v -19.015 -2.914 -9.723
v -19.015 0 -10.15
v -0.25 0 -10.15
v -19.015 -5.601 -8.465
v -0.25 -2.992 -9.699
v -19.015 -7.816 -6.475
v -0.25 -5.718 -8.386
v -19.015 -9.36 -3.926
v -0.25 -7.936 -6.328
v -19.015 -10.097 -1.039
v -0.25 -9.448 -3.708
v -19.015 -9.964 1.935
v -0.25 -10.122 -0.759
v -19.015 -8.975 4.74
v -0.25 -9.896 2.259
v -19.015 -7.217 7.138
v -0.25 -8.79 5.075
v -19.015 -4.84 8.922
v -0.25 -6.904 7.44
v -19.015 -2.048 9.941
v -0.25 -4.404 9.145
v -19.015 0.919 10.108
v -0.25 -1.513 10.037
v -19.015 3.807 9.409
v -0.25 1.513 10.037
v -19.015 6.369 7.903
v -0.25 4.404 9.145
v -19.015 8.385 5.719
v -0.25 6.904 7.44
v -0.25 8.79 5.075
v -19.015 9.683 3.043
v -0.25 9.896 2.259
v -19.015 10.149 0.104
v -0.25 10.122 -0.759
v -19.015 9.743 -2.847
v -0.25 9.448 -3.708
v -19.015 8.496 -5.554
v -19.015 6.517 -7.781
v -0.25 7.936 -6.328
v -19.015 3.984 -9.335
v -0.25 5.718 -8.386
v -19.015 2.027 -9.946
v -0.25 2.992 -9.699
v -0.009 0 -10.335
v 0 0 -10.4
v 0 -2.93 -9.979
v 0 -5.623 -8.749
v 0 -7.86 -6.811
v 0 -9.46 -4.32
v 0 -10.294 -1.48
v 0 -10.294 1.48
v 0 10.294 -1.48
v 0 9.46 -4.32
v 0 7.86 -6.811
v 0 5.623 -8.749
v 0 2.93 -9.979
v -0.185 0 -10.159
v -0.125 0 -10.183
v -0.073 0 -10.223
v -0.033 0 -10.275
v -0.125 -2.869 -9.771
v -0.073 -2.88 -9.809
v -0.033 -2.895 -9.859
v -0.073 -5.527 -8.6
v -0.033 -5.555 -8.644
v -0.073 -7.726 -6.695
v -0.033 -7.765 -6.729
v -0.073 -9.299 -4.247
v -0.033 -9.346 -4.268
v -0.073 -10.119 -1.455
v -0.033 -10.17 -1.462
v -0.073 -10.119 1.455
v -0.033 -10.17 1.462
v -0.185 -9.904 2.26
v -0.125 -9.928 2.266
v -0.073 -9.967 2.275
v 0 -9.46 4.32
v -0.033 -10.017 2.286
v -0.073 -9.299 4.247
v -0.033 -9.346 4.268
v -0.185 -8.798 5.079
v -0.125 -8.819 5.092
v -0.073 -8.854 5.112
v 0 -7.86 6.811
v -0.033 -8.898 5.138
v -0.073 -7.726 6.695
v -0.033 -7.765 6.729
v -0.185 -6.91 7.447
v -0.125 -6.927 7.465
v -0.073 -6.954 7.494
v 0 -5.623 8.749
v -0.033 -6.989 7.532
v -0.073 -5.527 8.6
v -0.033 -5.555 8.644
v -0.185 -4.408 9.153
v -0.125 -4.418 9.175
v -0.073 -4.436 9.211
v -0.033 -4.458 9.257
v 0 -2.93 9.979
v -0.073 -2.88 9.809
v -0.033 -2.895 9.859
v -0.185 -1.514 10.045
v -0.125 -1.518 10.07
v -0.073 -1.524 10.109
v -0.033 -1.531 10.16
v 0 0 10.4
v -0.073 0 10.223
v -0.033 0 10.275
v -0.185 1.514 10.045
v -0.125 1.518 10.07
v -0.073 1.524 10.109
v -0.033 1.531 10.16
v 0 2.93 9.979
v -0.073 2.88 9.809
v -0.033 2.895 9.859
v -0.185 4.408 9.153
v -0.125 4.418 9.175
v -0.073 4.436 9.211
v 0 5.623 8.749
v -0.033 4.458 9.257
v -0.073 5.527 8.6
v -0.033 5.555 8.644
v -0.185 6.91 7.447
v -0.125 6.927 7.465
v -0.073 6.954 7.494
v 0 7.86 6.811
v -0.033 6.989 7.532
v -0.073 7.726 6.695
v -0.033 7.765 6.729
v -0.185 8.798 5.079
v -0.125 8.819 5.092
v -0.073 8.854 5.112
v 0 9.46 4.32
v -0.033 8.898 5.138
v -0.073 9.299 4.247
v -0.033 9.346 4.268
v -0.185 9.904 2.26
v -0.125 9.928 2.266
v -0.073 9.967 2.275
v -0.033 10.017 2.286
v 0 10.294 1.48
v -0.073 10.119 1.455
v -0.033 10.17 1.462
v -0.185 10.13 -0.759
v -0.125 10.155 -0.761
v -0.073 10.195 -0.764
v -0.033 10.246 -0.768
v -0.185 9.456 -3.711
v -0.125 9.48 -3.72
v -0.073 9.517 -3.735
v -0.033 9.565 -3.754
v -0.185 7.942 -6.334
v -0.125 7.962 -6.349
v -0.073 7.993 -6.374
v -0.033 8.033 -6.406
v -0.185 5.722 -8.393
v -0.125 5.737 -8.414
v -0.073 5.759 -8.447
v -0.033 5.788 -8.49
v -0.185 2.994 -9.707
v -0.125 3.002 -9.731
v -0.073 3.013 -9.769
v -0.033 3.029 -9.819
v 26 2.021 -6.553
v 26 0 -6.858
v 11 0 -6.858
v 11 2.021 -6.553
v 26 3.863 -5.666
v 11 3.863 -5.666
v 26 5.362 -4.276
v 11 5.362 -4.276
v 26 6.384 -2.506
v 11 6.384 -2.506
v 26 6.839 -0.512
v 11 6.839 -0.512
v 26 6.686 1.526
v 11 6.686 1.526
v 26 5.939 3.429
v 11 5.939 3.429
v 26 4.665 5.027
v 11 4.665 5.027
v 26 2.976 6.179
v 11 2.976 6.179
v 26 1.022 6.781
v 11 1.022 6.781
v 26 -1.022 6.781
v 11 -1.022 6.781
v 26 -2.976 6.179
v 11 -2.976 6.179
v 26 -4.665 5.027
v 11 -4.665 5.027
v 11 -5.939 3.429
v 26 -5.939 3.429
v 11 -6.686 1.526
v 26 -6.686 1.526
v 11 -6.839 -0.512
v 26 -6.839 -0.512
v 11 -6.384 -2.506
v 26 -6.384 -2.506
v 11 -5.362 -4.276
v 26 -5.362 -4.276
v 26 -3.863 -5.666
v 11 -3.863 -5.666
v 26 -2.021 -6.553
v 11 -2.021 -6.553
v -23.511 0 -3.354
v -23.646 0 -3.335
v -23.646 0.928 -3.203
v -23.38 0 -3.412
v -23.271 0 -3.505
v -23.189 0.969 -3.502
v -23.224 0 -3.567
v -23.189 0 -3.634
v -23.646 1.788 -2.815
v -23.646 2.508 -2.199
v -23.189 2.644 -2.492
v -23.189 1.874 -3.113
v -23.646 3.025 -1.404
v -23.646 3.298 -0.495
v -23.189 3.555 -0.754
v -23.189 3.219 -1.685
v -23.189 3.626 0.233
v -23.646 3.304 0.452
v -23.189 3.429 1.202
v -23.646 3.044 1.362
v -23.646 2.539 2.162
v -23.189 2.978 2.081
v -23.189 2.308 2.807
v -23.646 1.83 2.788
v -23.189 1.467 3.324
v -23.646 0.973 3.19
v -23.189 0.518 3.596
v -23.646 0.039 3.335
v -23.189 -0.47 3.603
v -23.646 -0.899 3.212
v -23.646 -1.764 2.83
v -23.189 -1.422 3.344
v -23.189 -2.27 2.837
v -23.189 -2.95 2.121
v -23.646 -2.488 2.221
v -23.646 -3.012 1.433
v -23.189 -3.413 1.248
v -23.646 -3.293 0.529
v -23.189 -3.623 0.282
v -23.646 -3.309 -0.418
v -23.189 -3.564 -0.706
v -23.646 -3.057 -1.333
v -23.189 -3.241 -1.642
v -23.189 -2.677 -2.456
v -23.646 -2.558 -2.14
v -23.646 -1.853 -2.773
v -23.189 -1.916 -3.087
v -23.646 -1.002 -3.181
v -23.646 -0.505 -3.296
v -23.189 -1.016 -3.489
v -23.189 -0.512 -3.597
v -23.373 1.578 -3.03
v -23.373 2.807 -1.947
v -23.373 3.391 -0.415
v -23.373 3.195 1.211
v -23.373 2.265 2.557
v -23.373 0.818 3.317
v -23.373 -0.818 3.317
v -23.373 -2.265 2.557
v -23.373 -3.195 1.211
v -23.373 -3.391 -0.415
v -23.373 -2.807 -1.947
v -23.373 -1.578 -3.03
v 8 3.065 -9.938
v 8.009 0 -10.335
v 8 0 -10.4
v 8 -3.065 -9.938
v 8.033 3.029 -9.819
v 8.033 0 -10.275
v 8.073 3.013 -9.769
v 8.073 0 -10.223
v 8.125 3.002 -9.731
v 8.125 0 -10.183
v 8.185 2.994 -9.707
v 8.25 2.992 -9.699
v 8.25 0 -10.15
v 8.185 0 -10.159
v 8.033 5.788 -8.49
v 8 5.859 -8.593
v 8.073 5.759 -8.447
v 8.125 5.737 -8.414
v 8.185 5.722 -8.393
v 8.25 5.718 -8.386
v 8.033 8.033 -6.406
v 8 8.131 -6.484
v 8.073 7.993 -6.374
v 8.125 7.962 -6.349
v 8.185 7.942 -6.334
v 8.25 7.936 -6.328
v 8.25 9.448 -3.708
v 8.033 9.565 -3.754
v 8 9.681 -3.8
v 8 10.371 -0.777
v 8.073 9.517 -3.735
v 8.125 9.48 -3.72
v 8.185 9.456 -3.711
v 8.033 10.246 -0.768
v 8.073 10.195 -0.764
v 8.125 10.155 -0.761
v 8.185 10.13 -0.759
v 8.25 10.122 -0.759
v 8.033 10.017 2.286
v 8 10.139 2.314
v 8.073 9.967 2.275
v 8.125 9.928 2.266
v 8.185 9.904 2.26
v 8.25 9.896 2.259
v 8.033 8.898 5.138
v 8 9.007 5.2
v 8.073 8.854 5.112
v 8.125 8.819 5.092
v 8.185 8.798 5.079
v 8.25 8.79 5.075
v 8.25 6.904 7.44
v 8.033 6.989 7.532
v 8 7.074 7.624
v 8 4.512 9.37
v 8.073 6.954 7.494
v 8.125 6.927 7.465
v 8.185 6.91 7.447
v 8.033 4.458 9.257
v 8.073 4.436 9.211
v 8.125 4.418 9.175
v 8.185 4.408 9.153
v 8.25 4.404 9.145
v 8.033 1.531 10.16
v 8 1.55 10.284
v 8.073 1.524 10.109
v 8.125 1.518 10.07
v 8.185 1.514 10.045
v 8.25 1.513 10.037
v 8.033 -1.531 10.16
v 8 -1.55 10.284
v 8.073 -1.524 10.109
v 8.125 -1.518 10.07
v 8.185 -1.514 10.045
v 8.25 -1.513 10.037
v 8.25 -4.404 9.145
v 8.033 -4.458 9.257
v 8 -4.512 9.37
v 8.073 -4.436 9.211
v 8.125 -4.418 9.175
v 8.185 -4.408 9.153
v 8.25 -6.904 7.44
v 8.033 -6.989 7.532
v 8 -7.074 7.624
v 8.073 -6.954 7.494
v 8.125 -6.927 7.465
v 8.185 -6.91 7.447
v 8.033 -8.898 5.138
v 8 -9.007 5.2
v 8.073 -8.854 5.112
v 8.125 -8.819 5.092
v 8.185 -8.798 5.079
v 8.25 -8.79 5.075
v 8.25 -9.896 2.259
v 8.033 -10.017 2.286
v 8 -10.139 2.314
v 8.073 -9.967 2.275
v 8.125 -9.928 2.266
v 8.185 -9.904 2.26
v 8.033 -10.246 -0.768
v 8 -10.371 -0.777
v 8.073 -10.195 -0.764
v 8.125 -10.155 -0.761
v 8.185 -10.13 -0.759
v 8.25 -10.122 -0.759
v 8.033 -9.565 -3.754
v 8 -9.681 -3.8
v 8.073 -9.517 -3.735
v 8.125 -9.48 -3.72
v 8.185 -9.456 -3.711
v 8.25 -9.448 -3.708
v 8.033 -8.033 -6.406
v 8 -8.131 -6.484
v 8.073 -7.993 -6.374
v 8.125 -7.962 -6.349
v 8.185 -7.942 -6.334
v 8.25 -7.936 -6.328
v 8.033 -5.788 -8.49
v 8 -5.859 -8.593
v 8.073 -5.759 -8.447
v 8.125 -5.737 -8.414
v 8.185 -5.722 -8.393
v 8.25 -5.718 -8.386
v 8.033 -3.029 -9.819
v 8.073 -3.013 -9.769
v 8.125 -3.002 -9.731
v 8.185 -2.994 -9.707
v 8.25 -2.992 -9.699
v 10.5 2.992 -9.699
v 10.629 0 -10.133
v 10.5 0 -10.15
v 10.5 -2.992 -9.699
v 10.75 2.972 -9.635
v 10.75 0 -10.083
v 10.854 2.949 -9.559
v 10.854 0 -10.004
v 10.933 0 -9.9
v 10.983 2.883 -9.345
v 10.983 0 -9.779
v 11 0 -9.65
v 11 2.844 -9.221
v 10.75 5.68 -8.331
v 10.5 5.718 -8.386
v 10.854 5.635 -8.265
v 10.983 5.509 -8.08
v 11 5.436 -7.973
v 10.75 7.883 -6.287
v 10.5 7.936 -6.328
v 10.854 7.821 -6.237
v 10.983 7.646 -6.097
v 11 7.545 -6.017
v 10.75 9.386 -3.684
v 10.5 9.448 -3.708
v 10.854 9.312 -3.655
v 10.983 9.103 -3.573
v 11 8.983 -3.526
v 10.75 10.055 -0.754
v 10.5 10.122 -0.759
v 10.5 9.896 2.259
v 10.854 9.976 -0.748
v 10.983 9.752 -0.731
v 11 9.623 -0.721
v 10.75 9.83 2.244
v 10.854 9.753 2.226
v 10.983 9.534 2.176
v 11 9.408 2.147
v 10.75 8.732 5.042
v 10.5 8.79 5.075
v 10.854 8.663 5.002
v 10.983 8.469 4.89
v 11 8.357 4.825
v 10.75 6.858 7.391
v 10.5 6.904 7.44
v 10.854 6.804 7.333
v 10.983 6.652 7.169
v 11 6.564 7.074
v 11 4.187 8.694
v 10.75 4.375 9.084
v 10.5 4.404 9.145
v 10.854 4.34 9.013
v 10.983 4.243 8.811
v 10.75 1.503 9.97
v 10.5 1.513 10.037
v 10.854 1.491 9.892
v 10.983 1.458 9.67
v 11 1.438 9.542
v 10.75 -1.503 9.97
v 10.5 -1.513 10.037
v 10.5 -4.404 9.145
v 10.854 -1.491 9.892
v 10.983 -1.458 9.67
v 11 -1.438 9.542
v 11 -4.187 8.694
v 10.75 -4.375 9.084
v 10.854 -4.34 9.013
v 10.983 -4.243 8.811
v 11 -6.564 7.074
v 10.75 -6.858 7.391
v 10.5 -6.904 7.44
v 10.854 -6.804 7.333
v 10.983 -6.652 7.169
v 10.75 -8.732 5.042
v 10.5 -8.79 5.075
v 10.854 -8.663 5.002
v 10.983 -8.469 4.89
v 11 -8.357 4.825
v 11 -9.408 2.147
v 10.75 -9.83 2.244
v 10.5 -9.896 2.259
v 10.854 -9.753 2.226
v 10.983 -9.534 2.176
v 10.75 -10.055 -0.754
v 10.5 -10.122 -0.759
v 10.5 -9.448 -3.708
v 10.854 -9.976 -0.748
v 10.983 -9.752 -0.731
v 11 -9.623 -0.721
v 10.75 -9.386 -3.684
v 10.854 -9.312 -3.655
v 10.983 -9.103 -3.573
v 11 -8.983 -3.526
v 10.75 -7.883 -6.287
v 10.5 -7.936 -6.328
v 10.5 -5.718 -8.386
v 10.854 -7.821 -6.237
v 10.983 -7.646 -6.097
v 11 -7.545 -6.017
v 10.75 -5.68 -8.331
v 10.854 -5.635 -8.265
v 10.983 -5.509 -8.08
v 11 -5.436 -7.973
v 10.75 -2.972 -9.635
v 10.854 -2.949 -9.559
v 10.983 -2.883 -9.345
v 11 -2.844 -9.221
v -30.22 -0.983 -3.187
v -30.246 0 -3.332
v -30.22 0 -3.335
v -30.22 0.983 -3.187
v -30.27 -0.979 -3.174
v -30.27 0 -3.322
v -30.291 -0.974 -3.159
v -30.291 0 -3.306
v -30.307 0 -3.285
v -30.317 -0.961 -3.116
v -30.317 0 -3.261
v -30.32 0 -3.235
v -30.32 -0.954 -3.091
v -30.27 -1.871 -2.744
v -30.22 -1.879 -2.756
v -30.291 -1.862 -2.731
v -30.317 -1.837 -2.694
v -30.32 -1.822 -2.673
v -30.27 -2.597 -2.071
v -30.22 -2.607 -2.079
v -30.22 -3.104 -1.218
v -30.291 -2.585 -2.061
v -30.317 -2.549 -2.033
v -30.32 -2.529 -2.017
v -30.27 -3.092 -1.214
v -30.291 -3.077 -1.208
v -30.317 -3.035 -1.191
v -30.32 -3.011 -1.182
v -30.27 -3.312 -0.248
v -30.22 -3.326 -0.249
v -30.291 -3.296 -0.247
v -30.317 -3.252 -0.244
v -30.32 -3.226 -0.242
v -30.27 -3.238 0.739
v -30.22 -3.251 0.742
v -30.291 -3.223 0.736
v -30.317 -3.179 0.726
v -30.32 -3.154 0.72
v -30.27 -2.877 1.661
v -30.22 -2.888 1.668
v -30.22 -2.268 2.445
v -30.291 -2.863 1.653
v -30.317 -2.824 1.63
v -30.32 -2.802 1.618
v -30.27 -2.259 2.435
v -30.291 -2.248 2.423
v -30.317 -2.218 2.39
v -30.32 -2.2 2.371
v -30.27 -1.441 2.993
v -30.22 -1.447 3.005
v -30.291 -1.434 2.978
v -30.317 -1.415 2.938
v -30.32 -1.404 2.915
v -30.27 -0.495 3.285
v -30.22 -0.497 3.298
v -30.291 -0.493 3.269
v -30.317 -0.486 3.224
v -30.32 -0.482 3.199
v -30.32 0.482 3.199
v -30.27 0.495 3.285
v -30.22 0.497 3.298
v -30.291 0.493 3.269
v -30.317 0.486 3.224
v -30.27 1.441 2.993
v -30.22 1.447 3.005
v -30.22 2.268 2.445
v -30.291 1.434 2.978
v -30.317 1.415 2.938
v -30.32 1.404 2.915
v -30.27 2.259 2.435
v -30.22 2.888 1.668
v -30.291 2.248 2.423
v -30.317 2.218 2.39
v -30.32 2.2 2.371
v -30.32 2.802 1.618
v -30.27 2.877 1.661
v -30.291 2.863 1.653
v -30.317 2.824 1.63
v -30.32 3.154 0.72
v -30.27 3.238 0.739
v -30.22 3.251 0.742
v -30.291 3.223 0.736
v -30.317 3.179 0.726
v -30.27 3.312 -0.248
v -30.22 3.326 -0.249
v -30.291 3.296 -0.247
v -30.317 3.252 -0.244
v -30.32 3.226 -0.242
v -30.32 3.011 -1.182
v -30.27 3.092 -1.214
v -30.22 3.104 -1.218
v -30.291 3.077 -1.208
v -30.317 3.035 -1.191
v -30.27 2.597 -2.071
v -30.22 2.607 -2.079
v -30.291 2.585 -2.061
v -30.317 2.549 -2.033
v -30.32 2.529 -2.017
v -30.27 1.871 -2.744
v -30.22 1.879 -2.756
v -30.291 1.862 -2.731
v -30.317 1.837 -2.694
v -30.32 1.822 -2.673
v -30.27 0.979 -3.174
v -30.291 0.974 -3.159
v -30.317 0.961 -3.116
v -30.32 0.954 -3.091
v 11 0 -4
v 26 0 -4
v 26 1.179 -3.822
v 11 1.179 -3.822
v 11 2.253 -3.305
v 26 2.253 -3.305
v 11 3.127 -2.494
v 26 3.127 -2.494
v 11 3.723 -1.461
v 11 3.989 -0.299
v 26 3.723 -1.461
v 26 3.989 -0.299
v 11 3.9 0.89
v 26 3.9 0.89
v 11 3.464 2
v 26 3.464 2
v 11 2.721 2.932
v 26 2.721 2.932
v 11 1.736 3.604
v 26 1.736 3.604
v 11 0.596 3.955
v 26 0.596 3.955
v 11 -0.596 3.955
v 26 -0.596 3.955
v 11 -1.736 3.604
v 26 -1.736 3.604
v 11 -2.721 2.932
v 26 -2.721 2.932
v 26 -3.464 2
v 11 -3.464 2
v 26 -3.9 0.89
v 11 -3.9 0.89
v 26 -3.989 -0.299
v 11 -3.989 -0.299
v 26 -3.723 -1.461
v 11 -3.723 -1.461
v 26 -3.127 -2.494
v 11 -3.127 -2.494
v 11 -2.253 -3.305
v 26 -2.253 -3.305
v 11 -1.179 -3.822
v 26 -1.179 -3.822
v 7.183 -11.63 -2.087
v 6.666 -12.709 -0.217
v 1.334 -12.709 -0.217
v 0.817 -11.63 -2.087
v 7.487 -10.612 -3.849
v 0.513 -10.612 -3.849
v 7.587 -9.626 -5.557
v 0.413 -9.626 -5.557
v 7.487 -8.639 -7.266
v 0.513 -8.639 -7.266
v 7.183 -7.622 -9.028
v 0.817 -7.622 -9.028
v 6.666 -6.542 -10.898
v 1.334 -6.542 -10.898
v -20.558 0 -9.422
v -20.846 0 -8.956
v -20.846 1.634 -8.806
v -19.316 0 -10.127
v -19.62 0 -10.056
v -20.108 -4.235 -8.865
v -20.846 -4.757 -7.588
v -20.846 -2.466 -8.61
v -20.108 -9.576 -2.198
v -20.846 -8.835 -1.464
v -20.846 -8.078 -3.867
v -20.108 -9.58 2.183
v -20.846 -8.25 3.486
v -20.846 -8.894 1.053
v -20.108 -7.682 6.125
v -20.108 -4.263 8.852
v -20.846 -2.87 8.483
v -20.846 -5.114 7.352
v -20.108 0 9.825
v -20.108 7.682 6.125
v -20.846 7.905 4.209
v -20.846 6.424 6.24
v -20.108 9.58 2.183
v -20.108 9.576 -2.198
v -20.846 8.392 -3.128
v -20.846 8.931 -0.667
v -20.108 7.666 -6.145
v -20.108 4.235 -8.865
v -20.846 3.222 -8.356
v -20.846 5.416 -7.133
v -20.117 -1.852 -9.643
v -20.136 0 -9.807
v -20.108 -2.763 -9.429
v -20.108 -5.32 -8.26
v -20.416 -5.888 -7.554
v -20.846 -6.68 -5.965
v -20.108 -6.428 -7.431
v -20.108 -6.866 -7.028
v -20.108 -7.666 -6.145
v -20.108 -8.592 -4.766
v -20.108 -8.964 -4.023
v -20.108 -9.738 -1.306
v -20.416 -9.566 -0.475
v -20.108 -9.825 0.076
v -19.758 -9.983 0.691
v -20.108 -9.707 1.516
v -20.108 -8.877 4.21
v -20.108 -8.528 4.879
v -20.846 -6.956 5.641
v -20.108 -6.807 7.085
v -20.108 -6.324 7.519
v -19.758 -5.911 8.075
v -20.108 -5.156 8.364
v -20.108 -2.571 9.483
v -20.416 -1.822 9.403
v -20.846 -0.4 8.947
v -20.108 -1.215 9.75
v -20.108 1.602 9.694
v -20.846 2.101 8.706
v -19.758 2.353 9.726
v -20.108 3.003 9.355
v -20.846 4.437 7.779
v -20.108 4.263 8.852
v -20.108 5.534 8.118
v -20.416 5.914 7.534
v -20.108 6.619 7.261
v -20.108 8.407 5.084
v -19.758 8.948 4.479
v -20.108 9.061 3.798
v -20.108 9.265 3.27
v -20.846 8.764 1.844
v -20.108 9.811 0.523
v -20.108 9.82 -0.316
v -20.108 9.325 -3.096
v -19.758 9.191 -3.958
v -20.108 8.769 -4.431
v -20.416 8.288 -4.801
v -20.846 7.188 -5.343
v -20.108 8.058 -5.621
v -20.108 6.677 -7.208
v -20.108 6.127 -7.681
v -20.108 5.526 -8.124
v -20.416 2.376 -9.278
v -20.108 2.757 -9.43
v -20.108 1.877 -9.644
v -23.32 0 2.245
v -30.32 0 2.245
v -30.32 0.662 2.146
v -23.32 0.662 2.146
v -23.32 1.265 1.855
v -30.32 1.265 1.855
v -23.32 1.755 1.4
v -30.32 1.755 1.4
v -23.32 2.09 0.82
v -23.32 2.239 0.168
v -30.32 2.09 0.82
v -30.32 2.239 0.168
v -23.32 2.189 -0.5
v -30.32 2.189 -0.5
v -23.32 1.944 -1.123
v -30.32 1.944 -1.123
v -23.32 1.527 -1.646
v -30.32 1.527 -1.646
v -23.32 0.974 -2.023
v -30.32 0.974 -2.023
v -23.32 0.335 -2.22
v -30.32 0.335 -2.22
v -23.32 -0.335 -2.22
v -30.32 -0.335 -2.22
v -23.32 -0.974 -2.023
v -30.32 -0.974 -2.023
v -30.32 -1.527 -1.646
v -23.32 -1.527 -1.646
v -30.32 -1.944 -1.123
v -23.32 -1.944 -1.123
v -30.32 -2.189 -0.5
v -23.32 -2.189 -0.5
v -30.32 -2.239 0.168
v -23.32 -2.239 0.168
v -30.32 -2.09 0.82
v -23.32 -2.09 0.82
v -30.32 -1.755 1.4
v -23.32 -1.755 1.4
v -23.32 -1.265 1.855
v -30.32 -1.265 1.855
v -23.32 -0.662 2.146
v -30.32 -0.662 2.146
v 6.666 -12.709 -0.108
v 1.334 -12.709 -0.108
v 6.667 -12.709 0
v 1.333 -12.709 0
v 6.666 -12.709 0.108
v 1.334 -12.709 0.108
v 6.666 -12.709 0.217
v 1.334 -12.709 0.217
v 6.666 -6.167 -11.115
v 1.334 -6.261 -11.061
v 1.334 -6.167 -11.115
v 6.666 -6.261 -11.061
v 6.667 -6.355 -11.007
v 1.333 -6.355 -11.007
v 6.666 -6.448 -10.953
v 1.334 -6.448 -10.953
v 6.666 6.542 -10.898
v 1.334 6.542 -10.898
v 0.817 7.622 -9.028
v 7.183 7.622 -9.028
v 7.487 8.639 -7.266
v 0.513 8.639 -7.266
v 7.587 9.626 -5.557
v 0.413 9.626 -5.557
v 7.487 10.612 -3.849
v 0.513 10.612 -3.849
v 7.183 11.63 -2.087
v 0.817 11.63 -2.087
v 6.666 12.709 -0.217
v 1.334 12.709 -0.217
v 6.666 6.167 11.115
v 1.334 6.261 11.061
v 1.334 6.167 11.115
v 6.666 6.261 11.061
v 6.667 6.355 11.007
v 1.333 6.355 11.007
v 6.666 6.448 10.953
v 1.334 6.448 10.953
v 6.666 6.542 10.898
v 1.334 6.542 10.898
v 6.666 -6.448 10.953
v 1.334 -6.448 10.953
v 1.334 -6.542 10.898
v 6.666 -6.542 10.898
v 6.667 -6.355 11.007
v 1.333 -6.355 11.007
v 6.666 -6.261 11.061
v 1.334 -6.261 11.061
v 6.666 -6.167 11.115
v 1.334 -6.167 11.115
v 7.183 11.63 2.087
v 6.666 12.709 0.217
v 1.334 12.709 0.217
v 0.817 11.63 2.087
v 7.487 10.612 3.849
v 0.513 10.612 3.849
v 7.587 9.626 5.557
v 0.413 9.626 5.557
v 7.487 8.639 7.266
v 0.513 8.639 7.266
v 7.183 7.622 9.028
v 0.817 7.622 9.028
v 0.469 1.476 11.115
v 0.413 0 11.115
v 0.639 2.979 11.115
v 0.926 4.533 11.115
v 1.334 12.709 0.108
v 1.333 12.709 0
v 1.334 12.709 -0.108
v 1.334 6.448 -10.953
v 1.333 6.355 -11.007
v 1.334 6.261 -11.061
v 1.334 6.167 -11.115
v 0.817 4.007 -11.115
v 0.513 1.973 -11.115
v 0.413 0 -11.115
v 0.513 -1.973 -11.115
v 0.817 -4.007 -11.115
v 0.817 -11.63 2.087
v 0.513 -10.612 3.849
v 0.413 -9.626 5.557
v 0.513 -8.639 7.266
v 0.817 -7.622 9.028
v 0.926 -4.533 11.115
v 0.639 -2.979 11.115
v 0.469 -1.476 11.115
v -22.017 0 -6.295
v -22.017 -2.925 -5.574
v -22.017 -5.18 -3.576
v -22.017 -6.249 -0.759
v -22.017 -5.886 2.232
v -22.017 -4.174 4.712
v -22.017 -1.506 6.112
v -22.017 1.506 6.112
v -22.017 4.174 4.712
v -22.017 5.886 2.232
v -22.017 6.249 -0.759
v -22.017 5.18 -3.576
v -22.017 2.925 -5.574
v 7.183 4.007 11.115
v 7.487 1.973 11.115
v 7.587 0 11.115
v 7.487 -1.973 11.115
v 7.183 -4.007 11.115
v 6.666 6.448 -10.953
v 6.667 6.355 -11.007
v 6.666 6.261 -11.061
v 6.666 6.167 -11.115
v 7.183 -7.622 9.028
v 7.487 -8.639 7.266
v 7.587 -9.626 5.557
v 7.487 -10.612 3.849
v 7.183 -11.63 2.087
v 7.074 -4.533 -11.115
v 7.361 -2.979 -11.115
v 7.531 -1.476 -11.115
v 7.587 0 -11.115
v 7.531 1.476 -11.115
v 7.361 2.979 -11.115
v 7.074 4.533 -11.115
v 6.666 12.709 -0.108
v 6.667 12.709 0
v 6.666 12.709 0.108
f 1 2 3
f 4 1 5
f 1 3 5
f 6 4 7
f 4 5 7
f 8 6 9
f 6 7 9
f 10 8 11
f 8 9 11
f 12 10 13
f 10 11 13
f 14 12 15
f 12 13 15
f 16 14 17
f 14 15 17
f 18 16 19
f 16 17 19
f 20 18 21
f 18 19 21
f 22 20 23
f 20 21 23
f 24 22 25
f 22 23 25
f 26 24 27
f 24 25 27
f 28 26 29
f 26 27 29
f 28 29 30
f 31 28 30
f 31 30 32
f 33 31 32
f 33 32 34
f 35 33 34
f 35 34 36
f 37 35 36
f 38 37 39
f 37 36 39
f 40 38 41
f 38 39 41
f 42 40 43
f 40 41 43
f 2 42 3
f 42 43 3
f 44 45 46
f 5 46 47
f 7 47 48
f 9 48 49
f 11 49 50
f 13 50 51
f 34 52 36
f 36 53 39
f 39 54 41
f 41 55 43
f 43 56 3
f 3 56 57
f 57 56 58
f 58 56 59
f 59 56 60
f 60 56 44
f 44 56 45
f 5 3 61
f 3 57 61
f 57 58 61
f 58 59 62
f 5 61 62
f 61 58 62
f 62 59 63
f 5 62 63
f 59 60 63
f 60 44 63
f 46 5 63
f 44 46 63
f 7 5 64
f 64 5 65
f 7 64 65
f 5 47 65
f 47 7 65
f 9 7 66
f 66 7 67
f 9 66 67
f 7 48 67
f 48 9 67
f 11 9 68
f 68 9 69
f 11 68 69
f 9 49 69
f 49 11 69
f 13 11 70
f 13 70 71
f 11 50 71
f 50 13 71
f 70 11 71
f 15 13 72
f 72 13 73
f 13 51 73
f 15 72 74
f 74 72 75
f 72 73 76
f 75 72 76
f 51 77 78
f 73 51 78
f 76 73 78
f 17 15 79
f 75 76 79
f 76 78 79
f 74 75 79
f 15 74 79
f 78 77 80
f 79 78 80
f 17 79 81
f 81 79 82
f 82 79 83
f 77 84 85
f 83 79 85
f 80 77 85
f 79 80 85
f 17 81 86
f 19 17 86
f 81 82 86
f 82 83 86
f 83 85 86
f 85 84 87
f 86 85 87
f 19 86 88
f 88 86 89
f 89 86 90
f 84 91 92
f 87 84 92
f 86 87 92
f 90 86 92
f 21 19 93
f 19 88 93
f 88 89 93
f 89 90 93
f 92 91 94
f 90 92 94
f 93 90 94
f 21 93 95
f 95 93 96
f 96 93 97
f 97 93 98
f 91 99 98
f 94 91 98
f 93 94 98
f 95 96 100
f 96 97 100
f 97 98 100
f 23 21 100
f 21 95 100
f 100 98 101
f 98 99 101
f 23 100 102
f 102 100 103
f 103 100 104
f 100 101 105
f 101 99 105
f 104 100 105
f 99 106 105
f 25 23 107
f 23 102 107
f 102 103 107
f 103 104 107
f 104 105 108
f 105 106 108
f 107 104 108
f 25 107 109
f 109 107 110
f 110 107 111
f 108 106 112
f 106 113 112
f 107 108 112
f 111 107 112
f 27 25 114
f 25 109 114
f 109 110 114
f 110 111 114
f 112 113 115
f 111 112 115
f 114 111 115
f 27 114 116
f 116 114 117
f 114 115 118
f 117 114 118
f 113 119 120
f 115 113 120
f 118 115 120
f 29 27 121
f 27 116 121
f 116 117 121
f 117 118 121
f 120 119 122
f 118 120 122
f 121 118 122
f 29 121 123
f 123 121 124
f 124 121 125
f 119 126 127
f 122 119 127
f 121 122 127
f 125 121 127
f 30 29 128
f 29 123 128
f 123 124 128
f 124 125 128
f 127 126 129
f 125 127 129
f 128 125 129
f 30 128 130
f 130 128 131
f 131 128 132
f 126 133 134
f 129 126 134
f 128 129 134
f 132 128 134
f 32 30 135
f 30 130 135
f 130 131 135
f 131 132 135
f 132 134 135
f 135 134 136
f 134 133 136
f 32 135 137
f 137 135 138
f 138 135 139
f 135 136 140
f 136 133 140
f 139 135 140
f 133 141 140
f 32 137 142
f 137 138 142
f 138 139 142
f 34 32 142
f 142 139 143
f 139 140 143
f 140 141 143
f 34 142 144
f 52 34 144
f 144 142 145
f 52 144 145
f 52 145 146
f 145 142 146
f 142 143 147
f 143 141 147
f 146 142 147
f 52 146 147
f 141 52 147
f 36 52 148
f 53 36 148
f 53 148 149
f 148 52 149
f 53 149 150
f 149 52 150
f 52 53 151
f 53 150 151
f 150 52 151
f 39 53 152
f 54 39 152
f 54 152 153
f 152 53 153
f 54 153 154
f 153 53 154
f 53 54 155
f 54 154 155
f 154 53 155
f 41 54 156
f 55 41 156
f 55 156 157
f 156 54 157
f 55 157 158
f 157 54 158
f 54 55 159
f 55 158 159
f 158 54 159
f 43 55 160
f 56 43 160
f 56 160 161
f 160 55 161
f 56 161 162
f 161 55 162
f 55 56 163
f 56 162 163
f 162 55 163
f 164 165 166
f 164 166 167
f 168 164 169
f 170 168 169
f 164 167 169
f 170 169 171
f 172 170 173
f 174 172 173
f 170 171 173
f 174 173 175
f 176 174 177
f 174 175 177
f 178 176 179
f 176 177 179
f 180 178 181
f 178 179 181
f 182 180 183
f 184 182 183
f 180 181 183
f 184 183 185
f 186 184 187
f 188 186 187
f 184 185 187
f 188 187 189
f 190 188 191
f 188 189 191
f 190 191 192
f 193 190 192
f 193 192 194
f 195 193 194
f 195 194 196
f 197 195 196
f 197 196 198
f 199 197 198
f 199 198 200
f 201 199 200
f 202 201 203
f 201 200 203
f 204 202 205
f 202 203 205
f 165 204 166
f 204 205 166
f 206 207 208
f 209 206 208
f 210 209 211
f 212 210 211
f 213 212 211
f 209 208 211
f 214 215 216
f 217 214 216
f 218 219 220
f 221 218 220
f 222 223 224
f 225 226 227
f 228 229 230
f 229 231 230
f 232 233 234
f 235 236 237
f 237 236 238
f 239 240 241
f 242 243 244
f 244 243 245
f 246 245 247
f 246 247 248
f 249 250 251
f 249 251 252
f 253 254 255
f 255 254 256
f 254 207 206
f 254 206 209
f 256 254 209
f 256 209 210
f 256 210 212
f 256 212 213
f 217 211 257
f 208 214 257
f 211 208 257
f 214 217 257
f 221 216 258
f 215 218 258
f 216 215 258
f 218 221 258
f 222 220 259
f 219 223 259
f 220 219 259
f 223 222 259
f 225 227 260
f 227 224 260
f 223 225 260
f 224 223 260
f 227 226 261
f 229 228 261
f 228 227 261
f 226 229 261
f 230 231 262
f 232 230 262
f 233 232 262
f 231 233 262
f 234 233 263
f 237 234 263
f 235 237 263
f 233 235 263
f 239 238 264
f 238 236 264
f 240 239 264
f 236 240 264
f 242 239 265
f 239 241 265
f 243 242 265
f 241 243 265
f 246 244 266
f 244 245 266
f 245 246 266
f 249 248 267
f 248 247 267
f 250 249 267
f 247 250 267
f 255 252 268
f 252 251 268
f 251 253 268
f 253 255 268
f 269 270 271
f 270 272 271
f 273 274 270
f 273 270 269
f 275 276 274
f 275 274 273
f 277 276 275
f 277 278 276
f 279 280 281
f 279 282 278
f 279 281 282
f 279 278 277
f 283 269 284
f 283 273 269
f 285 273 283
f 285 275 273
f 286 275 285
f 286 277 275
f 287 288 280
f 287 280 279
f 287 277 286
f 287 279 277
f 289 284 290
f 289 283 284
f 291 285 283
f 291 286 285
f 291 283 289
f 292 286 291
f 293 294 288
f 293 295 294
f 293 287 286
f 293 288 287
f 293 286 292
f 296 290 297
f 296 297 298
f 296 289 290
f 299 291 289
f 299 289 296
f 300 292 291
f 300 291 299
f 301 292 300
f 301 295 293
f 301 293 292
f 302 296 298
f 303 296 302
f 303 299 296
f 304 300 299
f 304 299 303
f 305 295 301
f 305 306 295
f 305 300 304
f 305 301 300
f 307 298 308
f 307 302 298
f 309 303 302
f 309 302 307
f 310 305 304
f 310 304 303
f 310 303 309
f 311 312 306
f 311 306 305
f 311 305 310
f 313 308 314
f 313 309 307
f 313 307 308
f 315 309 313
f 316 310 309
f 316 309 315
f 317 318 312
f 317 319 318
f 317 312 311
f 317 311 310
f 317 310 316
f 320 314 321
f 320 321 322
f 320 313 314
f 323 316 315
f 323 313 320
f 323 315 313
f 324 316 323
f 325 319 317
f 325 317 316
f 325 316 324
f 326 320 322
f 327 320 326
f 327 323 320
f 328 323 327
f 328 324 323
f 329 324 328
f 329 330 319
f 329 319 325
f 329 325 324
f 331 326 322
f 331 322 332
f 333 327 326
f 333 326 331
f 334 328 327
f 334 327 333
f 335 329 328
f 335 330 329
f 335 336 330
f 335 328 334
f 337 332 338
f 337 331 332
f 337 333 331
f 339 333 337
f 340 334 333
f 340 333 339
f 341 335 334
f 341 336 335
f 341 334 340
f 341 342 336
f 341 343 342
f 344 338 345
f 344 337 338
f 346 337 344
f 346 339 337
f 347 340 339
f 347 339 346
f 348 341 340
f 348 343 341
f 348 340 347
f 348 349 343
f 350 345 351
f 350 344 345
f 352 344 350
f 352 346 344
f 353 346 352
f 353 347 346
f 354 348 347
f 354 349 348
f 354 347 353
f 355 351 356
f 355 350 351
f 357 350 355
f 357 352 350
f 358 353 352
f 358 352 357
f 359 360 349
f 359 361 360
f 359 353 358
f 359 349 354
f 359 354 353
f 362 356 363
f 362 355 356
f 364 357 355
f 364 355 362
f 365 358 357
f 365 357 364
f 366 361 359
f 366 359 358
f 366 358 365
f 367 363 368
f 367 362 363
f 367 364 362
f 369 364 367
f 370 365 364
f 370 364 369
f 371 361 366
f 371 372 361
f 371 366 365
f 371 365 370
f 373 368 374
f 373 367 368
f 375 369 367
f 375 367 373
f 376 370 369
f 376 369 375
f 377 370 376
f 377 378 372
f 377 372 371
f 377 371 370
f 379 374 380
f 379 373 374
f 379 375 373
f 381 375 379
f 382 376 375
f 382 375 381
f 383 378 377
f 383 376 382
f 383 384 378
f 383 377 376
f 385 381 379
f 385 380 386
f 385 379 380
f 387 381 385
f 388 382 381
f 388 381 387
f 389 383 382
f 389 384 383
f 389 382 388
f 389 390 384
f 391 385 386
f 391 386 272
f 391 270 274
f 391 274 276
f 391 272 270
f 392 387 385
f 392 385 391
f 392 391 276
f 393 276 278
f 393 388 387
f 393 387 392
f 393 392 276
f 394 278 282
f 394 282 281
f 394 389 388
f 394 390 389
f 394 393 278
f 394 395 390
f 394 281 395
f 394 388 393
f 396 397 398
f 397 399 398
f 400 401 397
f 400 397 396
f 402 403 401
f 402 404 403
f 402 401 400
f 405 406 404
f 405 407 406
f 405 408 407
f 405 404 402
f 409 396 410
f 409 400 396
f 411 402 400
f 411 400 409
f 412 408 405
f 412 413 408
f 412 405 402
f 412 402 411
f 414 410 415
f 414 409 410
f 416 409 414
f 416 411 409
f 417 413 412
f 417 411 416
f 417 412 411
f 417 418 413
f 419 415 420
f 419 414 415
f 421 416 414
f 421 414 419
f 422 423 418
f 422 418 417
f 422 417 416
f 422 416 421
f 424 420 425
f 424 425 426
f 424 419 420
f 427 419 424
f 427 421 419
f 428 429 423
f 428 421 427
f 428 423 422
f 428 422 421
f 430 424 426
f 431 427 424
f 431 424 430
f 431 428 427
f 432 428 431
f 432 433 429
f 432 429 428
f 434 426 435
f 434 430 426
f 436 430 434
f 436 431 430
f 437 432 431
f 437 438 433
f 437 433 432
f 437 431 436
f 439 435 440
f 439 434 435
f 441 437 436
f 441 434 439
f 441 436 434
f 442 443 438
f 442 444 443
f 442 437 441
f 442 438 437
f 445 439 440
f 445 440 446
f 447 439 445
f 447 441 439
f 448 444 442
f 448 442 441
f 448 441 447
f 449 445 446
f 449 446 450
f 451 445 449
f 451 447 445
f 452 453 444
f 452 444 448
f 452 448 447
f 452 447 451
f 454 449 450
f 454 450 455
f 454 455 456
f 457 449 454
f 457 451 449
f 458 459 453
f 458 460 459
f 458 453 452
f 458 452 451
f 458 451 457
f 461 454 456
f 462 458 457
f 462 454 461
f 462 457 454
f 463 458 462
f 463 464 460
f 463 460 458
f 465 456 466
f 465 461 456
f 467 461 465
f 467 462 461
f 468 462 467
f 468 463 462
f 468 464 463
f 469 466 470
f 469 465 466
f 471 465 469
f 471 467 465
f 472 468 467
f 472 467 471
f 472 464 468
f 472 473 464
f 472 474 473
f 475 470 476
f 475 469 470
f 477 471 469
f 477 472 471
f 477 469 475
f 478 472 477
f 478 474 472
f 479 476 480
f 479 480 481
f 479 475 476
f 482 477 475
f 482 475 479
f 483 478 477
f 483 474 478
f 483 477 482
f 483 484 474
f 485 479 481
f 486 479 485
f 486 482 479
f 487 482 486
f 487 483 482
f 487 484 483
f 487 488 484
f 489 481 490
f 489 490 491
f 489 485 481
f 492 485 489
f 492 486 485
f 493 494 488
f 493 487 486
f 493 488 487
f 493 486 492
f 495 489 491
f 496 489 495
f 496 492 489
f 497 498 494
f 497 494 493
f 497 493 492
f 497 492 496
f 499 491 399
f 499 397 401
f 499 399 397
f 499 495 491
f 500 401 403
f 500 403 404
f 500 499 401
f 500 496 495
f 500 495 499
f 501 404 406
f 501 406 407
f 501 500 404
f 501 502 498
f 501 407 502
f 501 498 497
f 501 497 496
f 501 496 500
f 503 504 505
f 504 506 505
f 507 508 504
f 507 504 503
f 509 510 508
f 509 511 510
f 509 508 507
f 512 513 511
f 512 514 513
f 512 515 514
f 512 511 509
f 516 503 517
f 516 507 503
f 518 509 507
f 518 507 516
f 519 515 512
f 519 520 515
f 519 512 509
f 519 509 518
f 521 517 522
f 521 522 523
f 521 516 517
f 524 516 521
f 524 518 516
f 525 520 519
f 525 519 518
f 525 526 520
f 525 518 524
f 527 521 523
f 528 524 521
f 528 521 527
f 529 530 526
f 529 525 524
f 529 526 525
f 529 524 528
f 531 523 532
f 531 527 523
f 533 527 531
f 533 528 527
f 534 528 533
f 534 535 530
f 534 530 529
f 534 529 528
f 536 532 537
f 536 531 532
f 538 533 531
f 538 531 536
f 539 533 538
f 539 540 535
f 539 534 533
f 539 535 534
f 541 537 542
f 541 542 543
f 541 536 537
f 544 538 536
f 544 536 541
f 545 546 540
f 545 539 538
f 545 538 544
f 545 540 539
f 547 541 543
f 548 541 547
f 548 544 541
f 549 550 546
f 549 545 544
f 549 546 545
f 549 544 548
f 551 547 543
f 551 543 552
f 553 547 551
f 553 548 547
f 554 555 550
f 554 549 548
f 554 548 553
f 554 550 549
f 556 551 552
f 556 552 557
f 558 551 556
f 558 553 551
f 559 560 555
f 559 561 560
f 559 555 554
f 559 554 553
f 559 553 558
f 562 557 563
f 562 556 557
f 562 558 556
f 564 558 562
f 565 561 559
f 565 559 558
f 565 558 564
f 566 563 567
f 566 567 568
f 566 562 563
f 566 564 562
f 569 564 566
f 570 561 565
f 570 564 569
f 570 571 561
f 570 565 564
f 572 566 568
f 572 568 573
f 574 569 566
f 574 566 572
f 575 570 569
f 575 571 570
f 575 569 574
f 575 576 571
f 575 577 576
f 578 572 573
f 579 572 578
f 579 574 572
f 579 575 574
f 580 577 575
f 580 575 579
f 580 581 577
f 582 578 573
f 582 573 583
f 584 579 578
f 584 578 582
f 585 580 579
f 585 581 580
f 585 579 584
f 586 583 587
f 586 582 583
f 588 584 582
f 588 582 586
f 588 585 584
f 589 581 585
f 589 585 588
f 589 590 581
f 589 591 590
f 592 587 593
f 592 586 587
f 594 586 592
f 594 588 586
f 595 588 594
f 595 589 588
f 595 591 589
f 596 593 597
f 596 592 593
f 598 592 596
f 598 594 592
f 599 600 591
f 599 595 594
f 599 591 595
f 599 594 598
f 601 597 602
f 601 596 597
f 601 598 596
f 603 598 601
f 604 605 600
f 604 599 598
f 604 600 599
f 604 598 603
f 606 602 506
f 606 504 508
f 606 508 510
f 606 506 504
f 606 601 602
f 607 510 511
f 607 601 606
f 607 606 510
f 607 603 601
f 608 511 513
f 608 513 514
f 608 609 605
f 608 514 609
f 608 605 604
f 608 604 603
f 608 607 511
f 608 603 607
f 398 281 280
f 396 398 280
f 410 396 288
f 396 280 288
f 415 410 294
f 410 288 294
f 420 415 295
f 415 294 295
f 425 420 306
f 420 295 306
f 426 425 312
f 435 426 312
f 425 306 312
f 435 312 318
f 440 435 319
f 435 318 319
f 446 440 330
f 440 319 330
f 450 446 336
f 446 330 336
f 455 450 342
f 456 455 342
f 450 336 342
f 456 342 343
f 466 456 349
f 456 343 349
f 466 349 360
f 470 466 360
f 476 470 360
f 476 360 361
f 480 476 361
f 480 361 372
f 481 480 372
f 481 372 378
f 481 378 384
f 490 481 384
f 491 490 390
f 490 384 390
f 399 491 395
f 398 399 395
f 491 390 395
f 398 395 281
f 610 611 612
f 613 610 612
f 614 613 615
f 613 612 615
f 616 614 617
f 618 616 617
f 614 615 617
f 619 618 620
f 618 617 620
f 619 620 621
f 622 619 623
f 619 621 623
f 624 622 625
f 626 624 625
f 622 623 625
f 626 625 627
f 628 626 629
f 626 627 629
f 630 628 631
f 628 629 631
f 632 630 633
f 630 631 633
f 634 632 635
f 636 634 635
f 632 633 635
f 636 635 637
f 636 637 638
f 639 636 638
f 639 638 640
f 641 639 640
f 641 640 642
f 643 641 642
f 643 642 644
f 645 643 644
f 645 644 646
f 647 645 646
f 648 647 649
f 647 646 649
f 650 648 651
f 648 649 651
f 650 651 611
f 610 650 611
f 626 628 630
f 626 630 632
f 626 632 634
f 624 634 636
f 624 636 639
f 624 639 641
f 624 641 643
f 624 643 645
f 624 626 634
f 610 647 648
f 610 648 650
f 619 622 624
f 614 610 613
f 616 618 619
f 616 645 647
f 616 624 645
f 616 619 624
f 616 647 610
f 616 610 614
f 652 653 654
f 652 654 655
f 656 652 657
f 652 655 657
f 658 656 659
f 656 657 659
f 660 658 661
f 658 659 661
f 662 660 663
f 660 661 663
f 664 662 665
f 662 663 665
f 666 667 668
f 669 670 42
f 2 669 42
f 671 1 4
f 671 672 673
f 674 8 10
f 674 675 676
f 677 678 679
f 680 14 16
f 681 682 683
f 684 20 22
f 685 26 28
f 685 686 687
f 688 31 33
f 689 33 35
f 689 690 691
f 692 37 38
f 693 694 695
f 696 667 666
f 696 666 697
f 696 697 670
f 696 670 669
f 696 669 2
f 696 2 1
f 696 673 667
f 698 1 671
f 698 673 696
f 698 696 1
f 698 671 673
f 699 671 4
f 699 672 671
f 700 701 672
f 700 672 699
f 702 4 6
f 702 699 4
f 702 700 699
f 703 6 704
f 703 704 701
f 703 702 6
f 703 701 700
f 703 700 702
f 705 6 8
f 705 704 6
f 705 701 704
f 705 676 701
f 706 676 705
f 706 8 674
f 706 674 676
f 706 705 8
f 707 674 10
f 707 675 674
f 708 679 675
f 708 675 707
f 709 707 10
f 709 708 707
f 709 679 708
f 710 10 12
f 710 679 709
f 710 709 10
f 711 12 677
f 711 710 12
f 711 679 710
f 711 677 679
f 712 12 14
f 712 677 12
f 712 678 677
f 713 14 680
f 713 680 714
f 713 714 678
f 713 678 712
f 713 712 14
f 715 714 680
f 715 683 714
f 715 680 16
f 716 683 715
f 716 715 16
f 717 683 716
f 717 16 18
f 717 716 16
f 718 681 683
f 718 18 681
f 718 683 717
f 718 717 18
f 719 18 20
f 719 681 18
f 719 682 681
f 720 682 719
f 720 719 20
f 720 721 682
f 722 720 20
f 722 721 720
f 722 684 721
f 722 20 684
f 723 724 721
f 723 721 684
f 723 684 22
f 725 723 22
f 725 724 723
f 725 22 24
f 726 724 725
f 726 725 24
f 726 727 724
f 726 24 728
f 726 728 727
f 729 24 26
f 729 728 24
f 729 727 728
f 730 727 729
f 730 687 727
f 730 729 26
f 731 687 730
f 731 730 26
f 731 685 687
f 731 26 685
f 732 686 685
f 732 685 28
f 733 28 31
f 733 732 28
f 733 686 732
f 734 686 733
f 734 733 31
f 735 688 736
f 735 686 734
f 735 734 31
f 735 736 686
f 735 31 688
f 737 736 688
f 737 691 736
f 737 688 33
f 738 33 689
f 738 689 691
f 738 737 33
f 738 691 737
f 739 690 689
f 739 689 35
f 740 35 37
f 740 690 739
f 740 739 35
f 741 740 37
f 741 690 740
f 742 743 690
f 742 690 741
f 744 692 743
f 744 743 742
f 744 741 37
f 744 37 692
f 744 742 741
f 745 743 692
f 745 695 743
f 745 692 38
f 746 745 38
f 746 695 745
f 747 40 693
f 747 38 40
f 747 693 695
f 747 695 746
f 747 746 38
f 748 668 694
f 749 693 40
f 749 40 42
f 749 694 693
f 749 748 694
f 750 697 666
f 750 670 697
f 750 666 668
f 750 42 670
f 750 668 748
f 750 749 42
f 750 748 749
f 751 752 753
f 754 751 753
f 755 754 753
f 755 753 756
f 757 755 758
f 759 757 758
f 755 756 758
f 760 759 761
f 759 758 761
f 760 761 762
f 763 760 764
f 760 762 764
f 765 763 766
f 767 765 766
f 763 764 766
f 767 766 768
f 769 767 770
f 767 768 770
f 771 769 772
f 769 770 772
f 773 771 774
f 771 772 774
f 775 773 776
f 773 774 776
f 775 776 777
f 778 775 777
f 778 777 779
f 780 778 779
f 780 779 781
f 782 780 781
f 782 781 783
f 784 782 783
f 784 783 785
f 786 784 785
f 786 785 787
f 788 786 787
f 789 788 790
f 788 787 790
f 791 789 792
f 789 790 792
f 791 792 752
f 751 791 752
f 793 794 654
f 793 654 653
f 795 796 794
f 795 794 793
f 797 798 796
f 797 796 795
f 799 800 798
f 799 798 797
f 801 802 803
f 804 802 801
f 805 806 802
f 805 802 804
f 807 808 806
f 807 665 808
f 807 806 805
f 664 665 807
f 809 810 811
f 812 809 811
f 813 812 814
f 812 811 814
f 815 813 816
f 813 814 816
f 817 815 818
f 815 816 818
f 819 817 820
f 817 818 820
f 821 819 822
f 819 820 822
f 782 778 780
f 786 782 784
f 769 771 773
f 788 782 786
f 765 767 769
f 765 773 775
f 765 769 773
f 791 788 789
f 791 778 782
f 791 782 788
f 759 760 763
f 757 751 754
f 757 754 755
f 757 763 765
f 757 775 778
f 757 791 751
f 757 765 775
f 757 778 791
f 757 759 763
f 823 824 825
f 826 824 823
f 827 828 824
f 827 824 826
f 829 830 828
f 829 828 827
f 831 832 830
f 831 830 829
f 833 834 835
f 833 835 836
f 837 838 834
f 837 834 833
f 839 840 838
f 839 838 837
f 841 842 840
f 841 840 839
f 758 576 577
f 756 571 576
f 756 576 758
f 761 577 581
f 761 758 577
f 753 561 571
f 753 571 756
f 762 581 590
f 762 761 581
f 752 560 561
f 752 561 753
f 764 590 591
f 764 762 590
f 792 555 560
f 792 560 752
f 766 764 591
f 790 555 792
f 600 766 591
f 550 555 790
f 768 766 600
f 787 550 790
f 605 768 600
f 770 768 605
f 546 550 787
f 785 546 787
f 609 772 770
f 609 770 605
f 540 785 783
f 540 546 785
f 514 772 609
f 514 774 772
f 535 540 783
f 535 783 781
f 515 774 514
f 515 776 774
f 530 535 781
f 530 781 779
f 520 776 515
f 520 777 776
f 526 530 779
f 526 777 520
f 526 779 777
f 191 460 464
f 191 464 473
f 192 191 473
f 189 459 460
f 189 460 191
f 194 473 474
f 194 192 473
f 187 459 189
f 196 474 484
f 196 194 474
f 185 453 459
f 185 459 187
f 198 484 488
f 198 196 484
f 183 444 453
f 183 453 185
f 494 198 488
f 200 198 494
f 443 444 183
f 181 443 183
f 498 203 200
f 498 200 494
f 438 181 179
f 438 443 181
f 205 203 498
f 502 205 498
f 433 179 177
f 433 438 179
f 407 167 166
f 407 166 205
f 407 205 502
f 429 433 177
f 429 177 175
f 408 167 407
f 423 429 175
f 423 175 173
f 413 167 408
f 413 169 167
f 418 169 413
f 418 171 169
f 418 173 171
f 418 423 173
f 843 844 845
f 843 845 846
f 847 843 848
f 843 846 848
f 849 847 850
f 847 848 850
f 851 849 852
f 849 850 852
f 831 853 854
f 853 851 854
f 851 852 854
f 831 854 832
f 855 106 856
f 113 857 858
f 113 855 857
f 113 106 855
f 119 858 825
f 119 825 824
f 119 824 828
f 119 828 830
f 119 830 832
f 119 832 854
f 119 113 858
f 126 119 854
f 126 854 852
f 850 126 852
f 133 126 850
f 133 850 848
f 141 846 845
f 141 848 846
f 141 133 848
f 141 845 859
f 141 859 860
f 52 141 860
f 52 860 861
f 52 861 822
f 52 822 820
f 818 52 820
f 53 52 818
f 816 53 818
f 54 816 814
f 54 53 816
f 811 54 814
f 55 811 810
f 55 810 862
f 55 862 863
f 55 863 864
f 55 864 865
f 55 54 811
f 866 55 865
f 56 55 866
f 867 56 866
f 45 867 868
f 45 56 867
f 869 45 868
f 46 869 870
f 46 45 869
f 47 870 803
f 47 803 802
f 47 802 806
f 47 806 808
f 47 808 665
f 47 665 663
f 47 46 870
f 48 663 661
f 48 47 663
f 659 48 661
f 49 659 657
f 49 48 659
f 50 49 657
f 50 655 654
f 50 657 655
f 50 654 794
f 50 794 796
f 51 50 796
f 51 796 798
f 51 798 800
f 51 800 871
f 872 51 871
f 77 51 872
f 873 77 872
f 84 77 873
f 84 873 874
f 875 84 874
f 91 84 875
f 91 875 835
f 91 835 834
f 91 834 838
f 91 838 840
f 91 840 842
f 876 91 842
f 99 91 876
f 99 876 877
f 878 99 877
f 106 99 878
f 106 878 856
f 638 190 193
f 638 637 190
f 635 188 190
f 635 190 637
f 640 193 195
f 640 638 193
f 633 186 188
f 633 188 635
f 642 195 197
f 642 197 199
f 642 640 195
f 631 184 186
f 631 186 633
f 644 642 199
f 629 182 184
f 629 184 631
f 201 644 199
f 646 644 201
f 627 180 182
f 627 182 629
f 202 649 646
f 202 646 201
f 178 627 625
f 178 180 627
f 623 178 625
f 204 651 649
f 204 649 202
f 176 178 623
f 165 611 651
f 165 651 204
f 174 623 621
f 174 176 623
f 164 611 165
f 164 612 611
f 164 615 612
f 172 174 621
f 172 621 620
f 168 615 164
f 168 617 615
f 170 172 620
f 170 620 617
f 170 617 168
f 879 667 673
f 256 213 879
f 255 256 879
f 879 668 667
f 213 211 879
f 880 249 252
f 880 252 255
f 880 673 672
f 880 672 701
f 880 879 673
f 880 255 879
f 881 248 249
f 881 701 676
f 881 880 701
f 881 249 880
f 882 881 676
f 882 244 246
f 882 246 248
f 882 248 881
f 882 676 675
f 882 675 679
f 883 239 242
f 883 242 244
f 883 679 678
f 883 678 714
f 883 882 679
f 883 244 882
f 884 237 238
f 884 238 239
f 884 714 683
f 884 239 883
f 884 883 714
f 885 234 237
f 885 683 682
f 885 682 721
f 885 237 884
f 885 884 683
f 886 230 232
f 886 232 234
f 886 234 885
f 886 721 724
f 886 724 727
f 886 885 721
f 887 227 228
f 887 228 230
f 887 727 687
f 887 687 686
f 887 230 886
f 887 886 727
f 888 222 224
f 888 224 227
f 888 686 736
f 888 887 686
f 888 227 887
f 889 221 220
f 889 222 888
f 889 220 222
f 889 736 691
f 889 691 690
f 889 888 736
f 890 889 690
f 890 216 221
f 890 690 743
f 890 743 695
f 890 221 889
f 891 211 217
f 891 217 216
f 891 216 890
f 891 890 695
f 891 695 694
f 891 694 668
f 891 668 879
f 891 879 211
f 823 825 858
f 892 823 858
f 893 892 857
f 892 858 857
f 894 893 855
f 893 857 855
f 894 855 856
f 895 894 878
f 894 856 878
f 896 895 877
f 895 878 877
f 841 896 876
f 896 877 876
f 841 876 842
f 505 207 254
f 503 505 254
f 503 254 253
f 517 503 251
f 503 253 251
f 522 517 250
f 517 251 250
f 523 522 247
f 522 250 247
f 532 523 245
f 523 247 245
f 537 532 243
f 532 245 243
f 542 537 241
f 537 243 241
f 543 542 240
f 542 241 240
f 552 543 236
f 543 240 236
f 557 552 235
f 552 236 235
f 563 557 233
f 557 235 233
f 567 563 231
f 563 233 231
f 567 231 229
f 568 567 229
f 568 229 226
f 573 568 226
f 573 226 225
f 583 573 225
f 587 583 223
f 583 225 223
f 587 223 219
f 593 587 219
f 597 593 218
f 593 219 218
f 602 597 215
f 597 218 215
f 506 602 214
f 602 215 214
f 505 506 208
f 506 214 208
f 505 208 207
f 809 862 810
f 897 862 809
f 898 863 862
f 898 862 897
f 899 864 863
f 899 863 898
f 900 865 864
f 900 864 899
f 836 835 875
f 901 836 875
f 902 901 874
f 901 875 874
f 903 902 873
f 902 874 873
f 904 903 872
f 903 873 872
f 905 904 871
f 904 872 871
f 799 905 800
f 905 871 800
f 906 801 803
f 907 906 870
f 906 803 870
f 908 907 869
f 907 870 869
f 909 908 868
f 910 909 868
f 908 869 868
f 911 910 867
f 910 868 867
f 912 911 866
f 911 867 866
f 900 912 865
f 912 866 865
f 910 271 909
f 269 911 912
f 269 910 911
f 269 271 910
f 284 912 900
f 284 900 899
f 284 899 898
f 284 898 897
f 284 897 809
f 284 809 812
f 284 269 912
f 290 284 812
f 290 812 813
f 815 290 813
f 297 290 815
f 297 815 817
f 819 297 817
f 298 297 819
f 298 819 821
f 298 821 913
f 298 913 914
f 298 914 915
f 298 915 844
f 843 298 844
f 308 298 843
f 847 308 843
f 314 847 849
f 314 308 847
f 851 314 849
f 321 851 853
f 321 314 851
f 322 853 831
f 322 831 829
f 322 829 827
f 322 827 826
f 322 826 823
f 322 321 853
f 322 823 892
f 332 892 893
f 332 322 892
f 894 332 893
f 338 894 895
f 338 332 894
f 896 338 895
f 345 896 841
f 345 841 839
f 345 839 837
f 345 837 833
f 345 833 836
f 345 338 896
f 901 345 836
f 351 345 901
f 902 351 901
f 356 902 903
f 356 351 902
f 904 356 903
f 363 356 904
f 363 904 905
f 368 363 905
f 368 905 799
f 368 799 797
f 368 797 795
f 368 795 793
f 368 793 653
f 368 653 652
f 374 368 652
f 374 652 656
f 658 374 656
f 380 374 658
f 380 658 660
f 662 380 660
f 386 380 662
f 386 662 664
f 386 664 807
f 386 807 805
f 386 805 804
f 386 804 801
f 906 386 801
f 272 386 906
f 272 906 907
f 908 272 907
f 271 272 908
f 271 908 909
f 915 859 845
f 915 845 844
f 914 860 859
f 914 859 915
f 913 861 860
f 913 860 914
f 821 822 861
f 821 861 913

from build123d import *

# Parameters (mm, degrees)
BOSS_EXTRUDE1_DEPTH  = 8
SKETCH2_R            = 10.15
BOSS_EXTRUDE2_DEPTH  = 3
SKETCH3_R            = 10.15
BOSS_EXTRUDE3_DEPTH  = 20.32
SKETCH4_R            = 3.335
BOSS_EXTRUDE4_DEPTH  = 3
SKETCH6_R            = 3.335
BOSS_EXTRUDE5_DEPTH  = 7
FILLET1_R            = 0.1
FILLET2_R            = 0.5
FILLET3_R            = 2
FILLET4_R            = 0.25
CHAMFER1_SIZE        = 0.25
CHAMFER1_EDGE_2_SIZE = 0.25
CHAMFER1_EDGE_3_SIZE = 0.25
CHAMFER1_EDGE_4_SIZE = 0.25
CHAMFER1_EDGE_5_SIZE = 0.25
CHAMFER1_EDGE_6_SIZE = 0.25
SKETCH7_R            = 6.858
BOSS_EXTRUDE6_DEPTH  = 15
SKETCH12_R           = 4
CUT_EXTRUDE1_DEPTH   = 15
FILLET5_R            = 0.5
SKETCH13_R           = 2.245309126
CUT_EXTRUDE2_DEPTH   = 7
SKETCH14_OUTSIDE_W   = 72.004
SKETCH14_OUTSIDE_H   = 75.192
SKETCH14_OUTSIDE_R   = 10.4
CUT_EXTRUDE5_DEPTH   = 10
CUT_EXTRUDE5_DRAFT   = -60
SKETCH15_OUTSIDE_W   = 72.004
SKETCH15_OUTSIDE_H   = 75.192
SKETCH15_OUTSIDE_R   = 10.4
CUT_EXTRUDE6_DEPTH   = 10
CUT_EXTRUDE6_DRAFT   = -60


with BuildPart() as part:
    # Sketch1 → Boss-Extrude1 (new body)
    with BuildSketch(Plane(origin=(0, 0, 0), x_dir=(0, 0, -1), z_dir=(1, 0, 0))):
        Polygon((11.115, -6.417248242), (11.115, 6.417248242), (0, 12.834496484), (-11.115, 6.417248242), (-11.115, -6.417248242), (0, -12.834496484), align=None)
    extrude(amount=BOSS_EXTRUDE1_DEPTH)

    # Sketch2 → Boss-Extrude2 (add)
    with BuildSketch(Plane(origin=(8, 0, 0), x_dir=(0, 0, -1), z_dir=(1, 0, 0))):
        Circle(SKETCH2_R)
    extrude(amount=BOSS_EXTRUDE2_DEPTH)

    # Sketch3 → Boss-Extrude3 (add)
    with BuildSketch(Plane.ZY):
        with Locations(Location((0, 0, 0), (0, 0, 180))):
            Circle(SKETCH3_R)
    extrude(amount=BOSS_EXTRUDE3_DEPTH)

    # Sketch4 → Boss-Extrude4 (add)
    with BuildSketch(Plane.ZY.offset(20.32)):
        Circle(SKETCH4_R)
    extrude(amount=BOSS_EXTRUDE4_DEPTH)

    # loft up to a face of the part (loft1)
    loft([Face(Wire([part.edges().sort_by_distance((-20.32, -7.399031568, 6.948153125))[0]])), Face(Wire([part.edges().sort_by_distance((-23.32, 2.431110372, -2.282964598))[0]]))])

    # Sketch6 → Boss-Extrude5 (add)
    with BuildSketch(Plane.ZY.offset(23.32)):
        with Locations(Location((0, 0, 0), (0, 0, 180))):
            Circle(SKETCH6_R)
    extrude(amount=BOSS_EXTRUDE5_DEPTH)

    # Fillet1
    fillet1_edges = [part.edges().sort_by_distance(p)[0] for p in [
        (-30.32, 0, 3.335),
    ]]
    fillet(fillet1_edges, radius=FILLET1_R)

    # Fillet2
    fillet2_edges = [part.edges().sort_by_distance(p)[0] for p in [
        (-23.32, 0, 3.335),
    ]]
    fillet(fillet2_edges, radius=FILLET2_R)

    # Fillet3
    fillet3_edges = [part.edges().sort_by_distance(p)[0] for p in [
        (-20.32, 0, 10.15),
    ]]
    fillet(fillet3_edges, radius=FILLET3_R)

    # Fillet4
    fillet4_edges = [part.edges().sort_by_distance(p)[0] for p in [
        (8, 0, 10.15),
        (0, 0, 10.15),
    ]]
    fillet(fillet4_edges, radius=FILLET4_R)

    # Chamfer1
    chamfer1_edges = [part.edges().sort_by_distance(p)[0] for p in [
        (4, -12.834496484, 0),
    ]]
    chamfer(chamfer1_edges, length=CHAMFER1_SIZE)

    # Chamfer1 edge 2
    chamfer1_edge_2_edges = [part.edges().sort_by_distance(p)[0] for p in [
        (4, -6.417248242, 11.115),
    ]]
    chamfer(chamfer1_edge_2_edges, length=CHAMFER1_EDGE_2_SIZE)

    # Chamfer1 edge 3
    chamfer1_edge_3_edges = [part.edges().sort_by_distance(p)[0] for p in [
        (4, 6.417248242, 11.115),
    ]]
    chamfer(chamfer1_edge_3_edges, length=CHAMFER1_EDGE_3_SIZE)

    # Chamfer1 edge 4
    chamfer1_edge_4_edges = [part.edges().sort_by_distance(p)[0] for p in [
        (4, 12.834496484, 0),
    ]]
    chamfer(chamfer1_edge_4_edges, length=CHAMFER1_EDGE_4_SIZE)

    # Chamfer1 edge 5
    chamfer1_edge_5_edges = [part.edges().sort_by_distance(p)[0] for p in [
        (4, 6.417248242, -11.115),
    ]]
    chamfer(chamfer1_edge_5_edges, length=CHAMFER1_EDGE_5_SIZE)

    # Chamfer1 edge 6
    chamfer1_edge_6_edges = [part.edges().sort_by_distance(p)[0] for p in [
        (4, -6.417248242, -11.115),
    ]]
    chamfer(chamfer1_edge_6_edges, length=CHAMFER1_EDGE_6_SIZE)

    # Sketch7 → Boss-Extrude6 (add)
    with BuildSketch(Plane(origin=(11, 0, 0), x_dir=(0, 0, -1), z_dir=(1, 0, 0))):
        Circle(SKETCH7_R)
    extrude(amount=BOSS_EXTRUDE6_DEPTH)

    # Sketch12 → Cut-Extrude1 (cut)
    with BuildSketch(Plane(origin=(26, 0, 0), x_dir=(0, 0, -1), z_dir=(1, 0, 0))):
        Circle(SKETCH12_R)
    extrude(amount=-CUT_EXTRUDE1_DEPTH, mode=Mode.SUBTRACT)

    # Fillet5
    fillet5_edges = [part.edges().sort_by_distance(p)[0] for p in [
        (11, 0, 10.15),
    ]]
    fillet(fillet5_edges, radius=FILLET5_R)

    # Sketch13 → Cut-Extrude2 (cut)
    with BuildSketch(Plane.ZY.offset(30.32)):
        Circle(SKETCH13_R)
    extrude(amount=-CUT_EXTRUDE2_DEPTH, mode=Mode.SUBTRACT)


with BuildPart() as cut_extrude5_tool:
    # Sketch14 outside → Cut-Extrude5 (with draft: the straight prism first)
    with BuildSketch(Plane(origin=(8, 0, 0), x_dir=(0, 0, -1), z_dir=(1, 0, 0))):
        Rectangle(SKETCH14_OUTSIDE_W, SKETCH14_OUTSIDE_H)
        Circle(SKETCH14_OUTSIDE_R, mode=Mode.SUBTRACT)
    extrude(amount=-CUT_EXTRUDE5_DEPTH)
    # Cut-Extrude5: the draft: its side faces are tilted about the plane it starts from
    cut_extrude5_sides = [cut_extrude5_tool.faces().sort_by_distance(p)[0] for p in [
        (3, -37.596, 0),
        (3, 0, -36.002),
        (3, 37.596, 0),
        (3, 0, 36.002),
        (3, 0, 10.4),
    ]]
    draft(cut_extrude5_sides, Plane(origin=(8, 0, 0), x_dir=(0, 0, -1), z_dir=(1, 0, 0)), CUT_EXTRUDE5_DRAFT)


with BuildPart() as part_1:
    add(part.part)

    # Cut-Extrude5: cut by cut_extrude5_tool
    add(cut_extrude5_tool.part, mode=Mode.SUBTRACT)


with BuildPart() as cut_extrude6_tool:
    # Sketch15 outside → Cut-Extrude6 (with draft: the straight prism first)
    with BuildSketch(Plane.ZY):
        Rectangle(SKETCH15_OUTSIDE_W, SKETCH15_OUTSIDE_H)
        Circle(SKETCH15_OUTSIDE_R, mode=Mode.SUBTRACT)
    extrude(amount=-CUT_EXTRUDE6_DEPTH)
    # Cut-Extrude6: the draft: its side faces are tilted about the plane it starts from
    cut_extrude6_sides = [cut_extrude6_tool.faces().sort_by_distance(p)[0] for p in [
        (5, -37.596, 0),
        (5, 0, 36.002),
        (5, 37.596, 0),
        (5, 0, -36.002),
        (5, 0, -10.4),
    ]]
    draft(cut_extrude6_sides, Plane.ZY, CUT_EXTRUDE6_DRAFT)


with BuildPart() as part_2:
    add(part_1.part)

    # Cut-Extrude6: cut by cut_extrude6_tool
    add(cut_extrude6_tool.part, mode=Mode.SUBTRACT)


solid = part_2.part
